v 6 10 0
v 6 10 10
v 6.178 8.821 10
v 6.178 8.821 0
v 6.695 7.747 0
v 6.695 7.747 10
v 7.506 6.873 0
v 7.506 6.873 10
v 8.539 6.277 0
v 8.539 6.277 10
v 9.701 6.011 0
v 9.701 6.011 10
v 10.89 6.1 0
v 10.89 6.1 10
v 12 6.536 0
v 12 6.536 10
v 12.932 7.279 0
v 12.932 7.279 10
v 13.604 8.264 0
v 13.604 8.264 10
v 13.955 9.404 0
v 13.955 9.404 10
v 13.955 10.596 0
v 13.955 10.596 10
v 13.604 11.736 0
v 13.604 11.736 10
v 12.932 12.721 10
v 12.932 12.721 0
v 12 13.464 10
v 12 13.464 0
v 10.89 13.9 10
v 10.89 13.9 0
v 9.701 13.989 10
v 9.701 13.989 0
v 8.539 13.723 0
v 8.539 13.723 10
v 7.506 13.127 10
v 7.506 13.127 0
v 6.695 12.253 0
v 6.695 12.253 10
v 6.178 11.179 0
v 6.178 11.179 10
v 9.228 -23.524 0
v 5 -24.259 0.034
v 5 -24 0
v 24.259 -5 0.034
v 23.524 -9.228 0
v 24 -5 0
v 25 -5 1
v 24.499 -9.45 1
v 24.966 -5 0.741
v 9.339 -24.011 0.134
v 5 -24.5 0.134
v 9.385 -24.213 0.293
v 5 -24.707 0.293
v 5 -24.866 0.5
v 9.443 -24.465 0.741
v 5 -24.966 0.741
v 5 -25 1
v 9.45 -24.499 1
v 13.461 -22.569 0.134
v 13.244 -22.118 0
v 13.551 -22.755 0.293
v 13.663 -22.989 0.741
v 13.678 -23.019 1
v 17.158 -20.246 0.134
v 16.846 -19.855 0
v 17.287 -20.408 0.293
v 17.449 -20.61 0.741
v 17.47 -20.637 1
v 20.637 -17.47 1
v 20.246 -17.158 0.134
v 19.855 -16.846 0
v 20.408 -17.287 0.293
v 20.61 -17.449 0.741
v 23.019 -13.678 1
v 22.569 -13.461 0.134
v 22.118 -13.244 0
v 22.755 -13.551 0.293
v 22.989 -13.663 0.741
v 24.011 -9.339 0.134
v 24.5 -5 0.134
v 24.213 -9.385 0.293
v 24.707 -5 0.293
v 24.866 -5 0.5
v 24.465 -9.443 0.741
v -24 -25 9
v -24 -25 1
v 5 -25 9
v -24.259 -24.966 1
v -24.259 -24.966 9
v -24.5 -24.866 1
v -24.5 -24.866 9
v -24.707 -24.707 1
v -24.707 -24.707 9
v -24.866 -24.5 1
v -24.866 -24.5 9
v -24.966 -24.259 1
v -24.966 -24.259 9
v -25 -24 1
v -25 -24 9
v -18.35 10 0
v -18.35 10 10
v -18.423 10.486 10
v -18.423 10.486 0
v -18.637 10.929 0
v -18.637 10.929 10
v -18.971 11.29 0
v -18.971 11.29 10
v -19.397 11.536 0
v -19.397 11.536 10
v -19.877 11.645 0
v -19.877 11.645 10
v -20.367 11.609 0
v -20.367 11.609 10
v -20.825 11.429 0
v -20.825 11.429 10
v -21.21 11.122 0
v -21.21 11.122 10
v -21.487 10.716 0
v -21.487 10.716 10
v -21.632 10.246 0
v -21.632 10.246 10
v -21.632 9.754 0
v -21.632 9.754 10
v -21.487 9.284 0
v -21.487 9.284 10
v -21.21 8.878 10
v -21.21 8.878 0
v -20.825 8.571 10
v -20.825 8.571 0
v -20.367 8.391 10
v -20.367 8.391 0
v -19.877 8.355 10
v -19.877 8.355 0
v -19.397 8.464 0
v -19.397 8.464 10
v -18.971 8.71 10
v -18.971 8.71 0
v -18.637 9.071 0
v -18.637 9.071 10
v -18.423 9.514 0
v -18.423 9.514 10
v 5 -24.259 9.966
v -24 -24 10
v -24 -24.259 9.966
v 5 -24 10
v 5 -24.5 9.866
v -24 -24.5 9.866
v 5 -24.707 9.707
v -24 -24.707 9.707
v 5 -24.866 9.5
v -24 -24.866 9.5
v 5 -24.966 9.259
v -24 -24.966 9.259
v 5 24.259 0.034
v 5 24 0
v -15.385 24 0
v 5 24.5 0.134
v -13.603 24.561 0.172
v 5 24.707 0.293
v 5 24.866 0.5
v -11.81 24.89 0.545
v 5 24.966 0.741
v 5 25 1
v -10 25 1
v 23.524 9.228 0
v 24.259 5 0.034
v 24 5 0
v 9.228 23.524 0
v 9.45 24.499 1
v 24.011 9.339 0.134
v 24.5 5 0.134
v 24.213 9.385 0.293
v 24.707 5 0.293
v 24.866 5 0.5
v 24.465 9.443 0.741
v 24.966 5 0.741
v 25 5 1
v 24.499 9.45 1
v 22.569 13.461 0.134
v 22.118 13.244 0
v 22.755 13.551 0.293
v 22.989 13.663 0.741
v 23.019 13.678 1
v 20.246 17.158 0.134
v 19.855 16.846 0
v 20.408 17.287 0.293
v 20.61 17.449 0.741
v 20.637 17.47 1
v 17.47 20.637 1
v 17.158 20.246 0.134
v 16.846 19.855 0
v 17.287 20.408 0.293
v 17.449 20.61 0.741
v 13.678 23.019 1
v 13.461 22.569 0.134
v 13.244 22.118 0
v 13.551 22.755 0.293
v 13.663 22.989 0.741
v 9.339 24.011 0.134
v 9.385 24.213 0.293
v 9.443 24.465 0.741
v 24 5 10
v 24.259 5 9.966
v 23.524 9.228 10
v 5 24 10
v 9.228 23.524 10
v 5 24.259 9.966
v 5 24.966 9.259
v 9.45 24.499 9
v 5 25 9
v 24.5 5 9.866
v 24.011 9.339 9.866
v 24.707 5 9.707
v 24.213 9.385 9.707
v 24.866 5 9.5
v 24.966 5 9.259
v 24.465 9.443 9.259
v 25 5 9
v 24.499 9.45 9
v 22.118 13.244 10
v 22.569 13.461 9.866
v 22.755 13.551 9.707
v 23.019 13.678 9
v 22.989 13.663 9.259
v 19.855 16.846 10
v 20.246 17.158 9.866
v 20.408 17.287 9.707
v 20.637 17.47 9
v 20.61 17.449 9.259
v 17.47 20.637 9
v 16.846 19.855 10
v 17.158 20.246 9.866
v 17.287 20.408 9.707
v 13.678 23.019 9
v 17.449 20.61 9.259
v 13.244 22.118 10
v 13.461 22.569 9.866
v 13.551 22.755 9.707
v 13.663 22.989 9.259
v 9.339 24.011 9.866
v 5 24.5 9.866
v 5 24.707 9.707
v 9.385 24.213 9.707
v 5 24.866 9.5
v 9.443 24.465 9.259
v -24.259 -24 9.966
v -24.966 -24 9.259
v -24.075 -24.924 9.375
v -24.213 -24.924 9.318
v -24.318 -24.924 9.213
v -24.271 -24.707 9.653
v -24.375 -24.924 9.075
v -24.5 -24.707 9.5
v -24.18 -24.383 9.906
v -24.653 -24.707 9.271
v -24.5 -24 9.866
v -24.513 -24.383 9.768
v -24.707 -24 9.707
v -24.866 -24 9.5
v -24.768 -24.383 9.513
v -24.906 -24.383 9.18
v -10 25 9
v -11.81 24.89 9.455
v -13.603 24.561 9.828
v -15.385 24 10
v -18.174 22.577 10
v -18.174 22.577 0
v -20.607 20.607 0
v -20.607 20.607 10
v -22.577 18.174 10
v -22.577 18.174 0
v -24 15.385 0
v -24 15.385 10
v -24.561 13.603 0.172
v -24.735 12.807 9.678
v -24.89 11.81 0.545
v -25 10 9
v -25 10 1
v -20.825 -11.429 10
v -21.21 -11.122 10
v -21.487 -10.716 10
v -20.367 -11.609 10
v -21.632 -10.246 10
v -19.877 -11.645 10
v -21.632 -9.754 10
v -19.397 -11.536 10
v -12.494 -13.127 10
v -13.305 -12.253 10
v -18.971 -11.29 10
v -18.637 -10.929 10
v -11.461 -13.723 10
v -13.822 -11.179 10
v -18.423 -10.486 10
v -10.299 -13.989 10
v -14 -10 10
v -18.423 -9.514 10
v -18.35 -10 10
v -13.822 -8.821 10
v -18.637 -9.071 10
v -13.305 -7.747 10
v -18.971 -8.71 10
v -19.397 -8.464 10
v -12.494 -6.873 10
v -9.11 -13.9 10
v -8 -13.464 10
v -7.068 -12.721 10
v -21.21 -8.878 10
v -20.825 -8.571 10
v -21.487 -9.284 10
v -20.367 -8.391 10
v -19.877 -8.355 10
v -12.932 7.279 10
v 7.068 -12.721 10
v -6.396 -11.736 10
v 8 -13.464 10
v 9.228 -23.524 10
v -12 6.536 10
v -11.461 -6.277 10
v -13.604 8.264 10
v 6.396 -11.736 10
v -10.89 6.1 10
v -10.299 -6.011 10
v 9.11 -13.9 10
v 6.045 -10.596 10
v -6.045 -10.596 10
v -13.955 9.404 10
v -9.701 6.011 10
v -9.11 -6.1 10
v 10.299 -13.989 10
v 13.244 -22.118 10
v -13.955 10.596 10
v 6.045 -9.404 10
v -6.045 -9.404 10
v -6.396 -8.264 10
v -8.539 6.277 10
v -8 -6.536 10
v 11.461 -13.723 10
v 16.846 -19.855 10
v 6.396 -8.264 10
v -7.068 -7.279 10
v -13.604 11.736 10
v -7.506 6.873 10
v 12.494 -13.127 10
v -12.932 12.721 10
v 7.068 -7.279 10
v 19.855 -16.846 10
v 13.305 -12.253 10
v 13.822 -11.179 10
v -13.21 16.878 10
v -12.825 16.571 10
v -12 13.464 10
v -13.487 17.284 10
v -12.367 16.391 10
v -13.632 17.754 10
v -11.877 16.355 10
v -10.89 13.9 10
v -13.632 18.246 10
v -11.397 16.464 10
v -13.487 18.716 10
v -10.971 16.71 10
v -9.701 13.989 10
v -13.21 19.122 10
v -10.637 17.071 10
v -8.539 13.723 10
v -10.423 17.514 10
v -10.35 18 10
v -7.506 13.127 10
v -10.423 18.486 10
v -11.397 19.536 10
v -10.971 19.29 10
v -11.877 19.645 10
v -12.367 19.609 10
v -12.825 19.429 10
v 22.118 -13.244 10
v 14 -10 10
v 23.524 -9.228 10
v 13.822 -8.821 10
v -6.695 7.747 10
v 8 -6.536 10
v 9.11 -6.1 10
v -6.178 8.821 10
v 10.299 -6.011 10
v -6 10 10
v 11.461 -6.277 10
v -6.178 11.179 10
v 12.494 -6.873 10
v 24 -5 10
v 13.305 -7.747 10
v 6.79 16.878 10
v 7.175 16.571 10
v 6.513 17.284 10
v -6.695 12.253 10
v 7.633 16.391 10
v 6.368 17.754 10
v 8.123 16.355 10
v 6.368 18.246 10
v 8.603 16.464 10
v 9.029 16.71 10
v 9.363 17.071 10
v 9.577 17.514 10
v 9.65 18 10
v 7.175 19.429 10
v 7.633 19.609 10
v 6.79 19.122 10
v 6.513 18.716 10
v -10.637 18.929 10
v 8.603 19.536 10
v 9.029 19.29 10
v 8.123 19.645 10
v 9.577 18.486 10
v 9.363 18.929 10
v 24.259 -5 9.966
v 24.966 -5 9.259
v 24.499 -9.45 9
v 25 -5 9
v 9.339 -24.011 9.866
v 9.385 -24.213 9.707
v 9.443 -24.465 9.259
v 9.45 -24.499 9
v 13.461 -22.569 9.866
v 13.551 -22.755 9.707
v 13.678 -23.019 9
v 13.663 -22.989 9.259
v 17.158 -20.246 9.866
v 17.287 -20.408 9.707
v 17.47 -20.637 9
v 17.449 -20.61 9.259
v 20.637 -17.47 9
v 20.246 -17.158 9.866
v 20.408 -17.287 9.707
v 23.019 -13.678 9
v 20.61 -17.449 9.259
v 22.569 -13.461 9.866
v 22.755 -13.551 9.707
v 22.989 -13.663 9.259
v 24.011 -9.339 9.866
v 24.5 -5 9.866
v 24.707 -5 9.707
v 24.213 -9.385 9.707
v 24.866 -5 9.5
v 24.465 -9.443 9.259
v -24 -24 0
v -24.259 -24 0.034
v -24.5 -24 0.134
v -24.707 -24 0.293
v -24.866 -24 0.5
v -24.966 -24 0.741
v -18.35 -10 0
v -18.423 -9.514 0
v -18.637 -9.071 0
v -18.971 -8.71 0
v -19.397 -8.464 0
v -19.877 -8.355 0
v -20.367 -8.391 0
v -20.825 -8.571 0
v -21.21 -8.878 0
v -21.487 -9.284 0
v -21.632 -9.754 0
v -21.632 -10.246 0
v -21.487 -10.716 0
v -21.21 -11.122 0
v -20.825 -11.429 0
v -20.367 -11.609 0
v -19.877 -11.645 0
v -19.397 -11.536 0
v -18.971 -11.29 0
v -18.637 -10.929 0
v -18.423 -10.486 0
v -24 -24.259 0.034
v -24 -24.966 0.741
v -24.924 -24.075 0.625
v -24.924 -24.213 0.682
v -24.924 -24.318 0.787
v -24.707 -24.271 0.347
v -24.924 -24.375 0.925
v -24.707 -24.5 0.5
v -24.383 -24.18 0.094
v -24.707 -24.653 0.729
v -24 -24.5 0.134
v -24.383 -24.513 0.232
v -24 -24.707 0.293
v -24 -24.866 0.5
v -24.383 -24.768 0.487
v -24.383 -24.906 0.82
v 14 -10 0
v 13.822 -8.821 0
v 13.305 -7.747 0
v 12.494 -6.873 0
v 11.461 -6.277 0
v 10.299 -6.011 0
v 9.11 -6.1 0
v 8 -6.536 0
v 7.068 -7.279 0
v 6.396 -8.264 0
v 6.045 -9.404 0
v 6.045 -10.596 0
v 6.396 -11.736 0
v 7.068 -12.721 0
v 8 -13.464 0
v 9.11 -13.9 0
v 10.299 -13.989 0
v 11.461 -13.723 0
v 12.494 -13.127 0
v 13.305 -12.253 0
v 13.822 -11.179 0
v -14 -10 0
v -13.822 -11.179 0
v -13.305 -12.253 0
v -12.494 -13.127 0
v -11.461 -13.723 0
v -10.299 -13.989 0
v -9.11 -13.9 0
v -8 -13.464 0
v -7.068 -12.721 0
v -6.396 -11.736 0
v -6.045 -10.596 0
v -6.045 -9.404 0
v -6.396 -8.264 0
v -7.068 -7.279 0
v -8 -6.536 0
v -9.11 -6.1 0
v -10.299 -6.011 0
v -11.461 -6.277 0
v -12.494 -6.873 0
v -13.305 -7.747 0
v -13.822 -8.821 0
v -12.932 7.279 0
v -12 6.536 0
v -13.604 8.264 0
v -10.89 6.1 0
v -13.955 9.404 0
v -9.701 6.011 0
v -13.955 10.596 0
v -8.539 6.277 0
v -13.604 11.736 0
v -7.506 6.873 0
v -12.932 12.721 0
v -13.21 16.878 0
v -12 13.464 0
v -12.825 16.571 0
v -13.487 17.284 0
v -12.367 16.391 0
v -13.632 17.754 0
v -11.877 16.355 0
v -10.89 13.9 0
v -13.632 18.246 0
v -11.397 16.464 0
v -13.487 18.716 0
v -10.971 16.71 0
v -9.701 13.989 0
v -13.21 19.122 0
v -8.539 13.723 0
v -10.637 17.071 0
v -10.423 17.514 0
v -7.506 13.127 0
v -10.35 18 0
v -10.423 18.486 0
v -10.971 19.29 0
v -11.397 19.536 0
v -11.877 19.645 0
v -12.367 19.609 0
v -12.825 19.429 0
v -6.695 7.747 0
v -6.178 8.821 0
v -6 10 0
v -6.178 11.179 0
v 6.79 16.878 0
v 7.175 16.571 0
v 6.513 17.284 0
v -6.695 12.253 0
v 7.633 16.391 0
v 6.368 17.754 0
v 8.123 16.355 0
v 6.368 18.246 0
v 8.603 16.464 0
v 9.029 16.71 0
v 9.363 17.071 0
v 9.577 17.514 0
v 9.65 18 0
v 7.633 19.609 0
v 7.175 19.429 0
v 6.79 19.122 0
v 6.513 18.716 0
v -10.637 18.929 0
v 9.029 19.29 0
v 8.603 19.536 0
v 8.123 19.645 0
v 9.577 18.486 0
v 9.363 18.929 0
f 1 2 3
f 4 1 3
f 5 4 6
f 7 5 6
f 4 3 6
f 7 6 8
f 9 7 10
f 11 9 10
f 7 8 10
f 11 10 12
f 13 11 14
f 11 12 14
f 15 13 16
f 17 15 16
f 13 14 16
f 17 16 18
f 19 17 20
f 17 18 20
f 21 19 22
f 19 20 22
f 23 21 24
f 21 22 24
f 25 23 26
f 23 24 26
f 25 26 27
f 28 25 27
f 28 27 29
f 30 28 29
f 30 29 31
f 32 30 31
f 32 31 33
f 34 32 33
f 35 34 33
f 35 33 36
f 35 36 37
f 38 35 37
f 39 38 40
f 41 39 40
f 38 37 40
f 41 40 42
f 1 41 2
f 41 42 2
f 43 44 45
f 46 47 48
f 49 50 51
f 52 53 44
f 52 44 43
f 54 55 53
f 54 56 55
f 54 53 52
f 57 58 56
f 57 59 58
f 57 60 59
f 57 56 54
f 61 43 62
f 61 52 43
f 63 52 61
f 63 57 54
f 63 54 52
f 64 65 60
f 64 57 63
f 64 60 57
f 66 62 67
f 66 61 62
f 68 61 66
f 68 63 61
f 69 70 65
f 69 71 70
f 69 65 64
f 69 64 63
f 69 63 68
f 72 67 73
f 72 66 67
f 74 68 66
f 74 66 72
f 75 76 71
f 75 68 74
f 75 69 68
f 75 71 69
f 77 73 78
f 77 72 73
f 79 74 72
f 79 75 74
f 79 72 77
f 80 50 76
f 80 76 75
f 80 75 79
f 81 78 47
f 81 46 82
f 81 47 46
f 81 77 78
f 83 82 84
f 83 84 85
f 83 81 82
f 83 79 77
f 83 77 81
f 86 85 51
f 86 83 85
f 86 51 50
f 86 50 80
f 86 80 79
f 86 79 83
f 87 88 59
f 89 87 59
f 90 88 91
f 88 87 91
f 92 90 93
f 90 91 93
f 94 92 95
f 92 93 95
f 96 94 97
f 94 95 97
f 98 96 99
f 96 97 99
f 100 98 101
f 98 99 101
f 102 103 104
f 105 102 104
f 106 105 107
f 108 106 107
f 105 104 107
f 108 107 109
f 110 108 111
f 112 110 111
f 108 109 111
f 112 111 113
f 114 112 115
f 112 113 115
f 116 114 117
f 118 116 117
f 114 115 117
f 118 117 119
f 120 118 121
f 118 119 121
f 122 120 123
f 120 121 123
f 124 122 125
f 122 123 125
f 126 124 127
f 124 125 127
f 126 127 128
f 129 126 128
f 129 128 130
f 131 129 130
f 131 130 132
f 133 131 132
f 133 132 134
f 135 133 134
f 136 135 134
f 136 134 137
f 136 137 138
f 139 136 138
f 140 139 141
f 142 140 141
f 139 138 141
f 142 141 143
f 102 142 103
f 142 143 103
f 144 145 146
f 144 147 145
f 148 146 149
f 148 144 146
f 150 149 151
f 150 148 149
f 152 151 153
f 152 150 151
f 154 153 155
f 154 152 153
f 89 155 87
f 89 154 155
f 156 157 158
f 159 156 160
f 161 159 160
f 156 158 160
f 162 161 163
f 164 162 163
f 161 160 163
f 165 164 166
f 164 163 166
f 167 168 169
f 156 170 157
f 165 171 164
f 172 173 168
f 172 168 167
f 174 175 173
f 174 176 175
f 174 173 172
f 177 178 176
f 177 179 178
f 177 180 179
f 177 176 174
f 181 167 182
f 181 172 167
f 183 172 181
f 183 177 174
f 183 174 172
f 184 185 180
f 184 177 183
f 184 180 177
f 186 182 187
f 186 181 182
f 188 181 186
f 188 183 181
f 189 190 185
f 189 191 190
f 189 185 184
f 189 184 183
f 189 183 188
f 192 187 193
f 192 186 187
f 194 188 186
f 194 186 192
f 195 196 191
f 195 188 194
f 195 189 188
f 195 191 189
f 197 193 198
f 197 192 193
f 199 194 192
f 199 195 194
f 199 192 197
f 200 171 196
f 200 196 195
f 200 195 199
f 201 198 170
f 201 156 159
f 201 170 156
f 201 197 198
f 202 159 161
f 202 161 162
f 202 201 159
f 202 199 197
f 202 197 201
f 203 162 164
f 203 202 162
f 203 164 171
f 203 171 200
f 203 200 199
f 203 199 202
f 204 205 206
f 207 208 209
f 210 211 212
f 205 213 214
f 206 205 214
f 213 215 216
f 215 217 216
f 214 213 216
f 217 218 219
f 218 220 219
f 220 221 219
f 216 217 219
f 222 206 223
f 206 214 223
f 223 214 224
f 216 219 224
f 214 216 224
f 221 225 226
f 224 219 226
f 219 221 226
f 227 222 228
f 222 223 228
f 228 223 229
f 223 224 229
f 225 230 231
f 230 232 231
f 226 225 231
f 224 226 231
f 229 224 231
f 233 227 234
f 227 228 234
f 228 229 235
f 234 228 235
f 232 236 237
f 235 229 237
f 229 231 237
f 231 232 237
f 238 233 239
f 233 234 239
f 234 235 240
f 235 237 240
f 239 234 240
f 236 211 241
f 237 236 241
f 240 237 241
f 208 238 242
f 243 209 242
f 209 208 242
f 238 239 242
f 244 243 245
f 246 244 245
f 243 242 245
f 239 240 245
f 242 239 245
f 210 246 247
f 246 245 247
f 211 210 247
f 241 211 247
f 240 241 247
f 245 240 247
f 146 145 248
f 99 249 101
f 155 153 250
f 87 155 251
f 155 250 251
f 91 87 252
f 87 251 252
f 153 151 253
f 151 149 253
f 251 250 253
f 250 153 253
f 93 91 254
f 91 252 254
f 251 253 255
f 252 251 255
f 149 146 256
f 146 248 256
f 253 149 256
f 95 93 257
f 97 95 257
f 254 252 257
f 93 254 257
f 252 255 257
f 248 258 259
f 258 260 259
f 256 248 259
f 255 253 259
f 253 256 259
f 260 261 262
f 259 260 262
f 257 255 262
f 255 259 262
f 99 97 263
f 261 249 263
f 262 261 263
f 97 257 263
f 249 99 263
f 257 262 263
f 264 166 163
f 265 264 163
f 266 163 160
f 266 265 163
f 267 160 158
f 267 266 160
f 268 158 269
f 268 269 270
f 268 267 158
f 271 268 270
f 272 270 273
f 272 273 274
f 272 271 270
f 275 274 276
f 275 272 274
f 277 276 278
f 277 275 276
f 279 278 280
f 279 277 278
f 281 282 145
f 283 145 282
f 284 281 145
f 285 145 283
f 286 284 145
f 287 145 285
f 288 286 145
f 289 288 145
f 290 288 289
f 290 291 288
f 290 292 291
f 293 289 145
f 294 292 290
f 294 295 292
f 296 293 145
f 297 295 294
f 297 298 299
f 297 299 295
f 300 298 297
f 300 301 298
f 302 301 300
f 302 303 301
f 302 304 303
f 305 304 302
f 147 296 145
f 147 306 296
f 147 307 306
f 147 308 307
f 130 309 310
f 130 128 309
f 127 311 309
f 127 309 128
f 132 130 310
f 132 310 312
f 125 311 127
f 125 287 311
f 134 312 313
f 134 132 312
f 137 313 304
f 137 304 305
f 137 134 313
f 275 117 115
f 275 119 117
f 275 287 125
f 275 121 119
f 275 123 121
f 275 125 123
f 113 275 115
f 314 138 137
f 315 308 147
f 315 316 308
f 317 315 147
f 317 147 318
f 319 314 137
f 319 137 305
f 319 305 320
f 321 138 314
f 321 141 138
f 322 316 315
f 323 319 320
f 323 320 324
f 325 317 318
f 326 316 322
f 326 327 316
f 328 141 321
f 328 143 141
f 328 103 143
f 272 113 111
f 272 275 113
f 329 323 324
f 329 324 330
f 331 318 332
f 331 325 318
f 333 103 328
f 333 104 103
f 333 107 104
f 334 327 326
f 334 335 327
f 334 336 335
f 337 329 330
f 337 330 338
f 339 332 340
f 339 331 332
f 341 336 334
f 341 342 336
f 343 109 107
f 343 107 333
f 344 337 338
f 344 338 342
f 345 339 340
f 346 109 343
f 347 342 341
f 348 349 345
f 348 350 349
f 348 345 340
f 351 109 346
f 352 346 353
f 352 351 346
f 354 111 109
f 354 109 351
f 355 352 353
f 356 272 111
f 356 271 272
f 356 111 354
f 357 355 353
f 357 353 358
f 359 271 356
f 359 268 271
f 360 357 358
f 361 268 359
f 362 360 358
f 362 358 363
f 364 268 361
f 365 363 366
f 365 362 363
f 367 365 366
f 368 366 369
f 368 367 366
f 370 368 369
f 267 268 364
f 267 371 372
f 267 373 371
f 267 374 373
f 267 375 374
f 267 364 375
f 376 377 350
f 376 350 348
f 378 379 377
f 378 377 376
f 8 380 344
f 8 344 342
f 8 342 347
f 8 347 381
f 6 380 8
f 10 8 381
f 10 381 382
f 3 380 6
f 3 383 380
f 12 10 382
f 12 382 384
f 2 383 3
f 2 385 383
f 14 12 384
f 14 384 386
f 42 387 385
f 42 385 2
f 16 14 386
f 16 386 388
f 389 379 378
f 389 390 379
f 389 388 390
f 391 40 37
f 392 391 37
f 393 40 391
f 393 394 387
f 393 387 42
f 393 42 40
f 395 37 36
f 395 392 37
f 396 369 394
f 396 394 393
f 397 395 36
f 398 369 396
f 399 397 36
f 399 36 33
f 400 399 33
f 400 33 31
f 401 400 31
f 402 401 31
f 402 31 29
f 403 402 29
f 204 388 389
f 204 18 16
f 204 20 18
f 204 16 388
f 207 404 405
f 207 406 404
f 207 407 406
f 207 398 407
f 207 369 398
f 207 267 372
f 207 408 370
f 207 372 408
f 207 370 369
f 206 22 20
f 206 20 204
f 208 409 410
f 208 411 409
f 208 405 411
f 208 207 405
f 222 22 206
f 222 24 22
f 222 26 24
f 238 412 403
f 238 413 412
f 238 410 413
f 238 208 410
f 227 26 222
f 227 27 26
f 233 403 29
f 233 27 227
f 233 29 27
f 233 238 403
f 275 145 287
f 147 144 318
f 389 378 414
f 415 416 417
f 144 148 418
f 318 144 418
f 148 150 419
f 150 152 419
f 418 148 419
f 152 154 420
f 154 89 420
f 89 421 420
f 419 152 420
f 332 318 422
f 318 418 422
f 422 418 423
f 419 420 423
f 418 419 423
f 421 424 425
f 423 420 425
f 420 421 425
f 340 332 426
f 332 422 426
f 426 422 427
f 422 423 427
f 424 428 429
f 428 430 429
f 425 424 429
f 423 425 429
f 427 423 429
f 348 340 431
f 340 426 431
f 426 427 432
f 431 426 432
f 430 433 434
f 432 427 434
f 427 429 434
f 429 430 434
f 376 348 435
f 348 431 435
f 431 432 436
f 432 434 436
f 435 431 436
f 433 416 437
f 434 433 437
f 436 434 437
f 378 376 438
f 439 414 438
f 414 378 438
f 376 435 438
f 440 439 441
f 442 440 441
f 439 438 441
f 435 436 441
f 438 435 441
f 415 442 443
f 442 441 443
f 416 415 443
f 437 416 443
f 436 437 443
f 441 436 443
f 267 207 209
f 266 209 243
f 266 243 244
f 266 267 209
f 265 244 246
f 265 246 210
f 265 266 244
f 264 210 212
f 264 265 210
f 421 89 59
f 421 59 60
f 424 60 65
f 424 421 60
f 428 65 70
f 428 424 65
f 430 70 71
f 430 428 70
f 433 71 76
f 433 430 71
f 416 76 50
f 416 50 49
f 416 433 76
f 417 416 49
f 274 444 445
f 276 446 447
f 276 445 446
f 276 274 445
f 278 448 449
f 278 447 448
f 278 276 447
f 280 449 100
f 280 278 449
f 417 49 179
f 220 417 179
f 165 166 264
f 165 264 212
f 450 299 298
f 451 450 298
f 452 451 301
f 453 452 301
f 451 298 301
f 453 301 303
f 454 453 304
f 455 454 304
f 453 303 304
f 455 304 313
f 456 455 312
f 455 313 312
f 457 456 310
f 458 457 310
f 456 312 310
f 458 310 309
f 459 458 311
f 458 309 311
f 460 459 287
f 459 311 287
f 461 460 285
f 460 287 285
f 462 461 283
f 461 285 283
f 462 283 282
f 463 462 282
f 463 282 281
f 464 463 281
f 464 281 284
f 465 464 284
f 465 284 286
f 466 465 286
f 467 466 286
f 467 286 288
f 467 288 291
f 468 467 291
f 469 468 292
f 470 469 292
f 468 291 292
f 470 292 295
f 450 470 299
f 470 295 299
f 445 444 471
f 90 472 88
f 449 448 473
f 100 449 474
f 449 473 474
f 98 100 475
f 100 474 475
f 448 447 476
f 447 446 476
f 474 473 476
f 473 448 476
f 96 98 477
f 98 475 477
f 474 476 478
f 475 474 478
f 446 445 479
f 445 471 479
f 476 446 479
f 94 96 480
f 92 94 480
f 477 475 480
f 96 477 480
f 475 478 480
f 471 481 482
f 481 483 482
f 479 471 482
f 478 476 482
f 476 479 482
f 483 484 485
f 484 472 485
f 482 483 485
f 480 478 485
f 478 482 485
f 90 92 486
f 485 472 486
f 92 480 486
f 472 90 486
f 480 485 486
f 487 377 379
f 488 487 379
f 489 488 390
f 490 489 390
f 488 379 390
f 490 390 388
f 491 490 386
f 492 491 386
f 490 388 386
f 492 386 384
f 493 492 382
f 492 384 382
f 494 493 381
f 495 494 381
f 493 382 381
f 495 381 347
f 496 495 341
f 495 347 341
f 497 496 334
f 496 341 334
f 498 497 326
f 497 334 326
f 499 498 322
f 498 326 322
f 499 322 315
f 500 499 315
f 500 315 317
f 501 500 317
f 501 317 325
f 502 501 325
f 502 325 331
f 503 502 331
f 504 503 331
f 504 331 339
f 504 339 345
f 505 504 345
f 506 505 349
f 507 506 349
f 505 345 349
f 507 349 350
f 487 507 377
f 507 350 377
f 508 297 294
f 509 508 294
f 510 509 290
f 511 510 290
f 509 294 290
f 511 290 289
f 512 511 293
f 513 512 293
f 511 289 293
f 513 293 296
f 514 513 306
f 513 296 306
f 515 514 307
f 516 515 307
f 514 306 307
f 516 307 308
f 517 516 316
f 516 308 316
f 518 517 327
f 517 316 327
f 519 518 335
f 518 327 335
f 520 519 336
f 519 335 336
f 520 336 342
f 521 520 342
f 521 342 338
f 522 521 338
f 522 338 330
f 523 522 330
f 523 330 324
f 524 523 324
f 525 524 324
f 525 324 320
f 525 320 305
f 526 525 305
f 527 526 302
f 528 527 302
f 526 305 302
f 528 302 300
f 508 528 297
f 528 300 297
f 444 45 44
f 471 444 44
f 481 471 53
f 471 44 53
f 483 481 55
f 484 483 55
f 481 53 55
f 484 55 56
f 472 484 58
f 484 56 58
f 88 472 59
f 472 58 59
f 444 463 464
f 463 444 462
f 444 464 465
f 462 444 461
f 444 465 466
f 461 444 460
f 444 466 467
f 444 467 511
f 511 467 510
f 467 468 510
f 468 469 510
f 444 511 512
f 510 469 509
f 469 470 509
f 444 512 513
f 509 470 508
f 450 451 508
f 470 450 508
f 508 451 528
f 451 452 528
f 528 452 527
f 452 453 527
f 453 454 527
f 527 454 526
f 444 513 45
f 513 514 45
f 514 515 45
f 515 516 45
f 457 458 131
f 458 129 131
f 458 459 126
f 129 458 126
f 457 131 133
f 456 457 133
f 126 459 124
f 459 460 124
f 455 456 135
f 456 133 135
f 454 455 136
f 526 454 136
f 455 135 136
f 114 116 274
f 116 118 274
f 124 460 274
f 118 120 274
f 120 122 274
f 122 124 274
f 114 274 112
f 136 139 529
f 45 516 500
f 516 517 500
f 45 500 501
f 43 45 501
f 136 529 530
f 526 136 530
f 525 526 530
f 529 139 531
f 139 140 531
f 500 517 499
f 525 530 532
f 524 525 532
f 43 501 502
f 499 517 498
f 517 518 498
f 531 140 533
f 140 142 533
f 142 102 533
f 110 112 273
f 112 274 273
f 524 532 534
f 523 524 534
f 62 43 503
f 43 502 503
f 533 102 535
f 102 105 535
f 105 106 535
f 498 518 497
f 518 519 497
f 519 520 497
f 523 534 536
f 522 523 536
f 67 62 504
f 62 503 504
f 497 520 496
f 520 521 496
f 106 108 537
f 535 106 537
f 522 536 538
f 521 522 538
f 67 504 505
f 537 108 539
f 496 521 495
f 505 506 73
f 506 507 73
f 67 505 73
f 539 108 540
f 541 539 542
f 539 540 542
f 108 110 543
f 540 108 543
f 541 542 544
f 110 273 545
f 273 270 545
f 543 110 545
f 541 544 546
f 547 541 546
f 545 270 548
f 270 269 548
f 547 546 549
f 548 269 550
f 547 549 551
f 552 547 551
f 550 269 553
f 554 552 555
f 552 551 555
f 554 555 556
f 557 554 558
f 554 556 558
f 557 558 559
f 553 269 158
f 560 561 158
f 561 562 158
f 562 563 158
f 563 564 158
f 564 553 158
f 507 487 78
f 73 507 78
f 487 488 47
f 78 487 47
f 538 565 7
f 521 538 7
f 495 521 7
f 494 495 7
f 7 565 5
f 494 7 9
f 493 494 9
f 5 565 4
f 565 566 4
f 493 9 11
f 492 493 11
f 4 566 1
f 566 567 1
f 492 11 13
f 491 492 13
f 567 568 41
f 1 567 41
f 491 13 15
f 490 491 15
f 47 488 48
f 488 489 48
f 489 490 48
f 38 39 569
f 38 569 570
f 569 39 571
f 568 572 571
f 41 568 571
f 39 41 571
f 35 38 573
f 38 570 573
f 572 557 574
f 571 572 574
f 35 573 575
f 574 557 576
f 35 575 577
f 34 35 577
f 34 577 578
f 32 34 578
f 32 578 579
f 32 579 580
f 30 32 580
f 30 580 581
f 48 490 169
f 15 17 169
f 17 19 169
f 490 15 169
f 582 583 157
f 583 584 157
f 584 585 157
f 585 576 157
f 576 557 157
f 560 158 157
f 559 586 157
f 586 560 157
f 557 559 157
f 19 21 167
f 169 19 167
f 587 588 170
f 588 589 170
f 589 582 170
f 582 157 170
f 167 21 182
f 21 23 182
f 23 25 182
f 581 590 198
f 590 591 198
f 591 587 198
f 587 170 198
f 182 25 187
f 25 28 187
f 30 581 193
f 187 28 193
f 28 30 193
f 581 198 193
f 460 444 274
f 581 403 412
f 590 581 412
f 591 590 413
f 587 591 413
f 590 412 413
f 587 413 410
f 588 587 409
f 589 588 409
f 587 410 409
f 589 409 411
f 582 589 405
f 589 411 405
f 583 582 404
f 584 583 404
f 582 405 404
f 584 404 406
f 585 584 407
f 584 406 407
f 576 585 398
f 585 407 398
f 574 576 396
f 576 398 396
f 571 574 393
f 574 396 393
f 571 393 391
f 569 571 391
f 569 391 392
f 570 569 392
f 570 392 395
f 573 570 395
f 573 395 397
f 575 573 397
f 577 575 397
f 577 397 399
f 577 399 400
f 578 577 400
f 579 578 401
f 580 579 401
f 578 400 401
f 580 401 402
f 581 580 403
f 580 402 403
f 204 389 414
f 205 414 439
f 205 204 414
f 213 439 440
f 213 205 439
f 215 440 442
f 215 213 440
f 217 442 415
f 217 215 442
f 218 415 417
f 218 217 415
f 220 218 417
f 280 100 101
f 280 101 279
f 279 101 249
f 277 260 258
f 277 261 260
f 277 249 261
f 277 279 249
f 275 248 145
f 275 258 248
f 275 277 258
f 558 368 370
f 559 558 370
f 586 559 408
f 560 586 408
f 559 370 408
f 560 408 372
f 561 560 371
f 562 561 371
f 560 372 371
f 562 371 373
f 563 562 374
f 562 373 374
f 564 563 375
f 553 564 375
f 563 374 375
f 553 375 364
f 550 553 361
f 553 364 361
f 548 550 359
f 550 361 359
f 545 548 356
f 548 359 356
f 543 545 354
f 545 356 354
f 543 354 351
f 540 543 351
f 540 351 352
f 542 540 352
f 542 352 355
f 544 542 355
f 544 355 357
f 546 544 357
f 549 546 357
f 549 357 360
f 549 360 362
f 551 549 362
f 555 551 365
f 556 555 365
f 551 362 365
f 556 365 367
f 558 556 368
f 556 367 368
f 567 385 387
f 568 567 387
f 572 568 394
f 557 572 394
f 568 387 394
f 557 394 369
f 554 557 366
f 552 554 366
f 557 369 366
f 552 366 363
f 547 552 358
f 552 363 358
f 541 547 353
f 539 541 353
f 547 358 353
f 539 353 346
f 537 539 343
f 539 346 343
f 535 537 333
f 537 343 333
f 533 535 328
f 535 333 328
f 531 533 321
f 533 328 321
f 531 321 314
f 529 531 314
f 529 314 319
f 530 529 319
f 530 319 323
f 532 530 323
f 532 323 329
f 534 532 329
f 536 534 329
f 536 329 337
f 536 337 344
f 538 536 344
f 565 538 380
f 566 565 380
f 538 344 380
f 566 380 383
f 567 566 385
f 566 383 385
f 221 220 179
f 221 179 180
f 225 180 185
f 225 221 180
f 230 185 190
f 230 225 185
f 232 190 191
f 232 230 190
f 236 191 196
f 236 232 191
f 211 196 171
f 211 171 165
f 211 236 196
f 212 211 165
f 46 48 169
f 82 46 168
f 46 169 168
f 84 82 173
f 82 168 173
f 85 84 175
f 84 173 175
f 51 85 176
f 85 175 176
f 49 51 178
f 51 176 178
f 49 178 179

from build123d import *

# Parameters (mm, degrees)
SKETCH_1_W          = 50
SKETCH_1_H          = 50
EXTRUDE_1_DEPTH     = 10
FILLET_1_R          = 20
FILLET_2_R          = 1
SKETCH_3_R          = 4
CUT_EXTRUDE_2_DEPTH = 10
SKETCH_4_R          = 1.65
CUT_EXTRUDE_3_DEPTH = 10
CUT_EXTRUDE_4_DEPTH = 10


with BuildPart() as part:
    # 草图1 → 凸台-拉伸1 (new body)
    with BuildSketch(Plane.XY):
        Rectangle(SKETCH_1_W, SKETCH_1_H)
    extrude(amount=EXTRUDE_1_DEPTH)

    # 圆角1
    fillet_1_edges = [part.edges().sort_by_distance(p)[0] for p in [
        (25, -25, 5),
        (25, 25, 5),
    ]]
    fillet(fillet_1_edges, radius=FILLET_1_R)

    # 圆角2
    fillet_2_edges = [part.edges().sort_by_distance(p)[0] for p in [
        (-25, 0, 10),
        (25, 0, 0),
        (25, 0, 10),
        (-10, -25, 10),
        (-10, 25, 0),
        (19.142135624, 19.142135624, 0),
        (19.142135624, -19.142135624, 0),
        (-10, 25, 10),
        (19.142135624, 19.142135624, 10),
        (19.142135624, -19.142135624, 10),
        (-10, -25, 0),
        (-25, 0, 0),
        (-25, -25, 5),
        (-25, 25, 5),
    ]]
    fillet(fillet_2_edges, radius=FILLET_2_R)

    # 草图3 → 切除-拉伸2 (cut)
    with BuildSketch(Plane.XY.offset(10)):
        with Locations((-10, 10)):
            Circle(SKETCH_3_R)
        with Locations(Location((10, 10, 0), (0, 0, 180))):
            Circle(SKETCH_3_R)
        with Locations((10, -10)):
            Circle(SKETCH_3_R)
        with Locations(Location((-10, -10, 0), (0, 0, 180))):
            Circle(SKETCH_3_R)
    extrude(amount=-CUT_EXTRUDE_2_DEPTH, mode=Mode.SUBTRACT)

    # 草图4 → 切除-拉伸3 (cut)
    with BuildSketch(Plane.XY.offset(10)):
        with Locations((-20, -10)):
            Circle(SKETCH_4_R)
        with Locations((-20, 10)):
            Circle(SKETCH_4_R)
        with Locations((-12, 18)):
            Circle(SKETCH_4_R)
        with Locations((8, 18)):
            Circle(SKETCH_4_R)
    extrude(amount=-CUT_EXTRUDE_3_DEPTH, mode=Mode.SUBTRACT)

    # 草图5 → 切除-拉伸4 (cut)
    with BuildSketch(Plane.XY.offset(10)):
        with BuildLine():
            Line((-25, 10), (-25, 6.241461477))
            Line((-25, 6.241461477), (-27.089820729, 25))
            Line((-27.089820729, 25), (-10, 25))
            ThreePointArc((-10, 25), (-20.606601718, 20.606601718), (-25, 10))
        make_face()
    extrude(amount=-CUT_EXTRUDE_4_DEPTH, mode=Mode.SUBTRACT)


solid = part.part
